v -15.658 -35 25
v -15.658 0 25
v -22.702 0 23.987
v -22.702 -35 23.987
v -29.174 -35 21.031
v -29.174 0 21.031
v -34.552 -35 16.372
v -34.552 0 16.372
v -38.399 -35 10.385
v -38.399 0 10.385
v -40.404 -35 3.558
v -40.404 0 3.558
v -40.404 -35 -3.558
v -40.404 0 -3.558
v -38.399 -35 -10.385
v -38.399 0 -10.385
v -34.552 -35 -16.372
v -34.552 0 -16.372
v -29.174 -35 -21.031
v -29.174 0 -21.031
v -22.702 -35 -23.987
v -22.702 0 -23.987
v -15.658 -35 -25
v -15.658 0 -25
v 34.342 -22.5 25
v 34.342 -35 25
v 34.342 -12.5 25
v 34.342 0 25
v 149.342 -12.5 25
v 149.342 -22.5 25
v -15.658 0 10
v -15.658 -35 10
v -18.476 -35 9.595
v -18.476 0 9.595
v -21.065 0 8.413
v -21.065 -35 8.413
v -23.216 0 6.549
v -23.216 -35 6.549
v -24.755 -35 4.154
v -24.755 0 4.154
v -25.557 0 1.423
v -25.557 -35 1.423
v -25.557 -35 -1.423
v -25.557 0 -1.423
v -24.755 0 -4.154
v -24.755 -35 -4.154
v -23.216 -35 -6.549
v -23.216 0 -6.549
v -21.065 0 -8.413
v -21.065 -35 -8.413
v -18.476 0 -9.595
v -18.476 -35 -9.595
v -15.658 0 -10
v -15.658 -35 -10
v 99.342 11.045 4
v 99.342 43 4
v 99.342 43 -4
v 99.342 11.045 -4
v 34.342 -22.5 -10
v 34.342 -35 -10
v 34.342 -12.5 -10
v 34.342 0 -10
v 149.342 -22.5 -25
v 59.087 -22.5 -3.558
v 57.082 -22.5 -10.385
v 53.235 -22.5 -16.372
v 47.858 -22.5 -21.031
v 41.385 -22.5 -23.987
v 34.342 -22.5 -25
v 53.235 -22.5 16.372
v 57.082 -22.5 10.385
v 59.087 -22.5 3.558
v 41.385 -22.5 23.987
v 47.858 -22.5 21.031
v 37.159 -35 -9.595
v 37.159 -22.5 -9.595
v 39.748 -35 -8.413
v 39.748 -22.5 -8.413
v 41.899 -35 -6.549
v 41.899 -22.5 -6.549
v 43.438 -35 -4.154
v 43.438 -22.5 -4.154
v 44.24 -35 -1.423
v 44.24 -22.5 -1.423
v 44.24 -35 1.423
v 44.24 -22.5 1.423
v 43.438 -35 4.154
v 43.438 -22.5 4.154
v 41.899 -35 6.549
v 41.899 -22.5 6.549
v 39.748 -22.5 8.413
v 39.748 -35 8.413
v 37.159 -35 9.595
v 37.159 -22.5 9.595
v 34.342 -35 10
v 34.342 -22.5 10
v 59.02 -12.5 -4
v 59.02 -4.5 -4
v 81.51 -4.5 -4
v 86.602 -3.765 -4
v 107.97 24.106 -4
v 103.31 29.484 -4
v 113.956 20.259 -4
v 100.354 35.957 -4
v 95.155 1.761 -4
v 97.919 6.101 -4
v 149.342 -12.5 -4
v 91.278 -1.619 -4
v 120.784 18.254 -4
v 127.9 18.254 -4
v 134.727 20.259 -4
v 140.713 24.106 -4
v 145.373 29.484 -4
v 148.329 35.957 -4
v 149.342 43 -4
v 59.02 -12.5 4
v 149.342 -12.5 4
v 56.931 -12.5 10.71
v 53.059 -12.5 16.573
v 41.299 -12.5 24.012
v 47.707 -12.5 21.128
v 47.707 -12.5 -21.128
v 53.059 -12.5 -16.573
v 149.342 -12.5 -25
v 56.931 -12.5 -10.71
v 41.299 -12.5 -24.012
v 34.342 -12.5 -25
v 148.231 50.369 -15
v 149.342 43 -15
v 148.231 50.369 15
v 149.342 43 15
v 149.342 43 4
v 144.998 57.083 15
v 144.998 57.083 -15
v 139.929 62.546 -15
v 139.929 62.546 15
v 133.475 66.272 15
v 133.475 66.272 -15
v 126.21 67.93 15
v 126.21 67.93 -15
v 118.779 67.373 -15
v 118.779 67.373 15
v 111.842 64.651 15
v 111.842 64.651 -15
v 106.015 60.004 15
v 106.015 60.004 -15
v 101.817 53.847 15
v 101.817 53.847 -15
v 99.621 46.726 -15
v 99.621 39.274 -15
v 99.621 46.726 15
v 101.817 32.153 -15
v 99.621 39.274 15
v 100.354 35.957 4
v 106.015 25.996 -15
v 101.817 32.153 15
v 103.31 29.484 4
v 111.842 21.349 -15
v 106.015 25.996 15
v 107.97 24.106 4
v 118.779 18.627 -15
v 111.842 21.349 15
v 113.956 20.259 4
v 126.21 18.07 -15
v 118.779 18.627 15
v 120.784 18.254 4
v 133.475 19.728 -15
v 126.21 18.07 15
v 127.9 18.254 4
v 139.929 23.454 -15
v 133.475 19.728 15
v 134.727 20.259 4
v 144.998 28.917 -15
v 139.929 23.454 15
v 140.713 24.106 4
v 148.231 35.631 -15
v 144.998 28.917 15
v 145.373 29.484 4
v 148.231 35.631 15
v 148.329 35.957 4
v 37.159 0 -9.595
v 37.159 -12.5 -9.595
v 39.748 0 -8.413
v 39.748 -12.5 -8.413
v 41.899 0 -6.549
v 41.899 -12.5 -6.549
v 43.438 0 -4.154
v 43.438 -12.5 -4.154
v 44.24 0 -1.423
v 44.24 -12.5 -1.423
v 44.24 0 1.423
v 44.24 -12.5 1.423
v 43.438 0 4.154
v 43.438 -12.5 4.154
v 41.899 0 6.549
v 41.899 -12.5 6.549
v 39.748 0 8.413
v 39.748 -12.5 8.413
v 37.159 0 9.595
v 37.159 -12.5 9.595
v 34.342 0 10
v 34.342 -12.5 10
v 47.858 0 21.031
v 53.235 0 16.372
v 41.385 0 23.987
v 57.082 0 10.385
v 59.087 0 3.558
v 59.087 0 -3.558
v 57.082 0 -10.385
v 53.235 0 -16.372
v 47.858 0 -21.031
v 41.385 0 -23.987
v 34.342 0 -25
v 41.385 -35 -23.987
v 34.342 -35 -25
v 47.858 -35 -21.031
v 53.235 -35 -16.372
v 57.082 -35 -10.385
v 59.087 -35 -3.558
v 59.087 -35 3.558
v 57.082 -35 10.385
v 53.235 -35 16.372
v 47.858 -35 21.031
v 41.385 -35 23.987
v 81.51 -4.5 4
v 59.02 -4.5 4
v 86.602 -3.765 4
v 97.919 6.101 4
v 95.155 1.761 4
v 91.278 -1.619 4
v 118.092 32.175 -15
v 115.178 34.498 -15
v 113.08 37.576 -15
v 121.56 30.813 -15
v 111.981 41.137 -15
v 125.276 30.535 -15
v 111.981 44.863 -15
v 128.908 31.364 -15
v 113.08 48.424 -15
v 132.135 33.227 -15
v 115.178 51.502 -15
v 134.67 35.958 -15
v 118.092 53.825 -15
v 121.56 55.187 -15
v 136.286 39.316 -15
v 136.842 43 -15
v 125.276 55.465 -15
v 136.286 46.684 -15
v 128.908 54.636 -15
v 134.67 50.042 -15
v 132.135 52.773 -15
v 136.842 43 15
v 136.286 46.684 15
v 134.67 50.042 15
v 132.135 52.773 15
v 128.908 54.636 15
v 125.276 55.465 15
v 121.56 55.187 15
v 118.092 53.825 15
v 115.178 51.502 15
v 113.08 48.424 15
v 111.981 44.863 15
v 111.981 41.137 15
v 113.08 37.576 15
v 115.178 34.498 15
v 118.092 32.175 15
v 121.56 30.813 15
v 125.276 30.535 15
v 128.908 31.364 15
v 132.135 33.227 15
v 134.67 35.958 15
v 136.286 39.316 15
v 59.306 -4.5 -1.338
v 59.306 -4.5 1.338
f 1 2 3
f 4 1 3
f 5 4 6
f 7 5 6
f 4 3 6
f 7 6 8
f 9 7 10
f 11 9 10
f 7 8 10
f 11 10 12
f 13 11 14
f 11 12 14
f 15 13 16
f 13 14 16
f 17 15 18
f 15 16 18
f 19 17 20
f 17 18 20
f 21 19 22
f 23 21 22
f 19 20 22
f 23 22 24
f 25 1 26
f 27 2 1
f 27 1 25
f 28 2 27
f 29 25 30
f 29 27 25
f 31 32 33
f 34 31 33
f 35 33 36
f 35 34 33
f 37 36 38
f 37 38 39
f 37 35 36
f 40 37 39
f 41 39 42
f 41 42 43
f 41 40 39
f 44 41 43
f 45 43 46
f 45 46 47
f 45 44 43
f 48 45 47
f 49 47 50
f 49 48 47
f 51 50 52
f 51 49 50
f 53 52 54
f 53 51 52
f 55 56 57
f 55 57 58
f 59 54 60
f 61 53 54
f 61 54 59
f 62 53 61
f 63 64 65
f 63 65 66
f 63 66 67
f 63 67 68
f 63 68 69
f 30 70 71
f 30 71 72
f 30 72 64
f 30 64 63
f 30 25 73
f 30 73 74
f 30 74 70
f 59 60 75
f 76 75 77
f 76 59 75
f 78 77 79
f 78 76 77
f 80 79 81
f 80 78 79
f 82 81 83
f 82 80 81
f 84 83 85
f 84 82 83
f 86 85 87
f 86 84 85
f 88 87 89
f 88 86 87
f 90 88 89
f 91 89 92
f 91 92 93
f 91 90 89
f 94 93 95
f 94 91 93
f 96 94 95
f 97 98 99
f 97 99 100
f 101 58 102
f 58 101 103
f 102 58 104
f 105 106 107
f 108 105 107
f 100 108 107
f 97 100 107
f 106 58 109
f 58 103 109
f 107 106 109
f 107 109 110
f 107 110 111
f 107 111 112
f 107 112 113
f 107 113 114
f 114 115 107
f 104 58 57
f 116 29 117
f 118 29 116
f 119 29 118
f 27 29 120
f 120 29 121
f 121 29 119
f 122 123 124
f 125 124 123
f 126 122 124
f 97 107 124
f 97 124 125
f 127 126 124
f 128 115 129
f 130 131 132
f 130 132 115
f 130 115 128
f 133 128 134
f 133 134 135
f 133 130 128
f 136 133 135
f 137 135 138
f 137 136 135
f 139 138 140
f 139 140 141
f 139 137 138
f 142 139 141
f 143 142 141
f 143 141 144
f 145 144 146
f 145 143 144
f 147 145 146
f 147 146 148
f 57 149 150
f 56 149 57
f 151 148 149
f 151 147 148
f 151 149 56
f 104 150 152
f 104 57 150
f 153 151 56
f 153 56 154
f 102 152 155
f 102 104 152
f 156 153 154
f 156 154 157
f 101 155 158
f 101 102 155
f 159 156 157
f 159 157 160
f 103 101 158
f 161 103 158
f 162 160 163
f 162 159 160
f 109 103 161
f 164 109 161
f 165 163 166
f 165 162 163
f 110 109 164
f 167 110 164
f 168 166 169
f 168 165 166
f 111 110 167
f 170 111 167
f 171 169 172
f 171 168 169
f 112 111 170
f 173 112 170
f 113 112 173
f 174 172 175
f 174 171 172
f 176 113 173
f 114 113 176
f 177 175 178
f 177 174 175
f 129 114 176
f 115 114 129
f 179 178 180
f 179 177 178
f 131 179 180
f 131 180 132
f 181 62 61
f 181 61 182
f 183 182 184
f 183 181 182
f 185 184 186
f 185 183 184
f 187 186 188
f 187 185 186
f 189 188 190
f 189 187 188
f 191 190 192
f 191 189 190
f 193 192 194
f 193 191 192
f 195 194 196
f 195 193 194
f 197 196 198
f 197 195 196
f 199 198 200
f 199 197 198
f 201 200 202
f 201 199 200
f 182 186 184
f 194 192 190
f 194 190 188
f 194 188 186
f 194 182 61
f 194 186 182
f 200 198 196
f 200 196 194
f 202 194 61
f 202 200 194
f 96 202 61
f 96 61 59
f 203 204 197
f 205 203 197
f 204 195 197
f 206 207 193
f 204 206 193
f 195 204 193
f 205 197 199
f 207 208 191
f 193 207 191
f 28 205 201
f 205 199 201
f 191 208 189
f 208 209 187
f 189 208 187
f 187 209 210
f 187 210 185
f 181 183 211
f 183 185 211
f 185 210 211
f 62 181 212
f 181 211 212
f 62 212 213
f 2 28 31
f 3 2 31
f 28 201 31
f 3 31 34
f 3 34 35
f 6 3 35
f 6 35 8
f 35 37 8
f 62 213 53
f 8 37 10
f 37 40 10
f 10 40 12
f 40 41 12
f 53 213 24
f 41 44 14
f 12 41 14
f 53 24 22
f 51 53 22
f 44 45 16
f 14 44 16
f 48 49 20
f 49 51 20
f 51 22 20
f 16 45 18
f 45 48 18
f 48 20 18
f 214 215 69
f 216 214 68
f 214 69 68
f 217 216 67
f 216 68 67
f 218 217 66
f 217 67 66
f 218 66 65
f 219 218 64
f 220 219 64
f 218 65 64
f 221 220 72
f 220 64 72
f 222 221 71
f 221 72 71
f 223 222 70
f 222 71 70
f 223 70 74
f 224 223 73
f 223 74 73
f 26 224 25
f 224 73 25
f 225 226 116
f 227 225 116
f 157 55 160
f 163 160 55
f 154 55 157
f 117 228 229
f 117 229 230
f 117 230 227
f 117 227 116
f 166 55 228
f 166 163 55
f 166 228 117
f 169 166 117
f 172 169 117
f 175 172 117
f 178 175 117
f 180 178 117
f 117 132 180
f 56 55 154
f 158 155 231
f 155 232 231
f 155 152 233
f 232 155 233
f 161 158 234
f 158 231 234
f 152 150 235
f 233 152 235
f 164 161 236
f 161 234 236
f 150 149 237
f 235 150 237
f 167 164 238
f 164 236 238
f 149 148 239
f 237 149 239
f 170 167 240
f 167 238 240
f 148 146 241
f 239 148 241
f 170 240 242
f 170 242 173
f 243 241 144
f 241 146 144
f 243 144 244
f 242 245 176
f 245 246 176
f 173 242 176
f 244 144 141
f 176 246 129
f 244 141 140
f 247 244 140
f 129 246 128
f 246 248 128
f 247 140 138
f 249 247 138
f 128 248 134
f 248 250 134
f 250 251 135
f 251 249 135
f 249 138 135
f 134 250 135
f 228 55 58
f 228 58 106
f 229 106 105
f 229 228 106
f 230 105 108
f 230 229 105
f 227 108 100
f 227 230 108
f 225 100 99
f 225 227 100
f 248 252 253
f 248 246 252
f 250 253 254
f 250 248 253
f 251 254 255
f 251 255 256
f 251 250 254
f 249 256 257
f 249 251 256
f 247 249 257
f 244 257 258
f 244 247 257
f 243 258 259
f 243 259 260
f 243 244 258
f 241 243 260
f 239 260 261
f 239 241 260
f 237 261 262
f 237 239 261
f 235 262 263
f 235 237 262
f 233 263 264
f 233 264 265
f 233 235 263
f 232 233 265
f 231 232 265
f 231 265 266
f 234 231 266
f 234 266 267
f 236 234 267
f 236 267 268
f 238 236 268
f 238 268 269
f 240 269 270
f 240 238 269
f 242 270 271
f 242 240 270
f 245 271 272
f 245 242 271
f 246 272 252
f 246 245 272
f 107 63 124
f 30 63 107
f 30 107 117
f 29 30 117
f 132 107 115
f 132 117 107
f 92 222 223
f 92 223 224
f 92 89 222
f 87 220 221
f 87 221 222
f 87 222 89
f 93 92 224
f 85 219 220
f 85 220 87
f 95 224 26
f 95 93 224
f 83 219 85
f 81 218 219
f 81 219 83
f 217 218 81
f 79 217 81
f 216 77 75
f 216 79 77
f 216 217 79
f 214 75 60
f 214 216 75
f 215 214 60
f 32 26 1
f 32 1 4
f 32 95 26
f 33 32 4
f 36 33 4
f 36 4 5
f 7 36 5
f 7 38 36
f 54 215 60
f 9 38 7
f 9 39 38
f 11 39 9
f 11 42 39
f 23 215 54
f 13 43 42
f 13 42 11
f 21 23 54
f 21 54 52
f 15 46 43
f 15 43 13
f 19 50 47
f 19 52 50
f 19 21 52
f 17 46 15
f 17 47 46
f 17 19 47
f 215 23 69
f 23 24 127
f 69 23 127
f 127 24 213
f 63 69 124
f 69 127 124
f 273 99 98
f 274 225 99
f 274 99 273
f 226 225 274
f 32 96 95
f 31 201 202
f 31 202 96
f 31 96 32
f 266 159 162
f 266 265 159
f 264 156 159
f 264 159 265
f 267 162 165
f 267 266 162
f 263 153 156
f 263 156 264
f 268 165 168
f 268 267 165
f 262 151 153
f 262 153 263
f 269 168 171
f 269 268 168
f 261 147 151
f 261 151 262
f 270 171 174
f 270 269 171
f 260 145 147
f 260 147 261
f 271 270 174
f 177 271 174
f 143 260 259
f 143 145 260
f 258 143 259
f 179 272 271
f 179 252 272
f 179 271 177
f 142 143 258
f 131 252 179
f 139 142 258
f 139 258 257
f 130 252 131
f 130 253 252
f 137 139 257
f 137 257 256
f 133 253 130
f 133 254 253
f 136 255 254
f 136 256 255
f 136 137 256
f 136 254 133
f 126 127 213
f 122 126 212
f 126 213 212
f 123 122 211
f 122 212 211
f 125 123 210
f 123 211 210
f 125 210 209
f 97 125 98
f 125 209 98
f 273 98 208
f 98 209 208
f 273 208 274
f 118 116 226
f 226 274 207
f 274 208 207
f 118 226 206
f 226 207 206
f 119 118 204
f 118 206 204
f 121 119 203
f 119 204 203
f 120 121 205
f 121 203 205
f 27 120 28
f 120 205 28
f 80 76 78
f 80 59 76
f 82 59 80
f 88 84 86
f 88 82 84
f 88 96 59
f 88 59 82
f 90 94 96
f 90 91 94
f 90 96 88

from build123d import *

# Parameters (mm, degrees)
BOSS_EXTRUDE1_DEPTH = 35
BOSS_EXTRUDE2_DEPTH = 50
BOSS_EXTRUDE4_DEPTH = 4
SKETCH4_R           = 25
SKETCH4_R_2         = 12.5
BOSS_EXTRUDE5_DEPTH = 15


with BuildPart() as part:
    # Sketch1 → Boss-Extrude1 (new body)
    with BuildSketch(Plane(origin=(0, 0, 0), x_dir=(1, 0, 0), z_dir=(0, 1, 0))):
        with BuildLine():
            Line((-15.658362989, 25), (34.341637011, 25))
            ThreePointArc((34.341637011, 25), (59.341637011, 0), (34.341637011, -25))
            Line((34.341637011, -25), (-15.658362989, -25))
            ThreePointArc((-15.658362989, -25), (-40.658362989, 0), (-15.658362989, 25))
        make_face()
        with BuildLine():
            Line((-15.658362989, 10), (34.341637011, 10))
            ThreePointArc((34.341637011, 10), (44.341637011, 0), (34.341637011, -10))
            Line((34.341637011, -10), (-15.658362989, -10))
            ThreePointArc((-15.658362989, -10), (-25.658362989, 0), (-15.658362989, 10))
        make_face(mode=Mode.SUBTRACT)
    extrude(amount=-BOSS_EXTRUDE1_DEPTH)

    # Sketch2 → Boss-Extrude2 (add)
    with BuildSketch(Plane.XY.offset(25)):
        Polygon((59.341637011, -12.5), (34.341637011, -12.5), (34.341637011, -22.5), (59.341637011, -22.5), (149.341637011, -22.5), (149.341637011, -12.5), align=None)
    extrude(amount=-BOSS_EXTRUDE2_DEPTH)

    # Sketch3 → Boss-Extrude4 (add, symmetric)
    with BuildSketch(Plane.XY):
        with BuildLine():
            Line((58.524856224, -12.5), (59.341637011, -12.5))
            Line((59.341637011, -12.5), (149.341637011, -12.5))
            Line((149.341637011, -12.5), (149.341637011, 43))
            ThreePointArc((149.341637011, 43), (124.341637011, 18), (99.341637011, 43))
            Line((99.341637011, 43), (99.341637011, 11.044665925))
            ThreePointArc((99.341637011, 11.044665925), (93.33790357, -0.068272059), (81.509886267, -4.5))
            Line((81.509886267, -4.5), (58.524856224, -4.5))
            Line((58.524856224, -4.5), (58.524856224, -12.5))
        make_face()
    extrude(amount=BOSS_EXTRUDE4_DEPTH, both=True)

    # Sketch4 → Boss-Extrude5 (add, symmetric)
    with BuildSketch(Plane.XY):
        with Locations((124.341637011, 43)):
            Circle(SKETCH4_R)
        with Locations((124.341637011, 43)):
            Circle(SKETCH4_R_2, mode=Mode.SUBTRACT)
    extrude(amount=BOSS_EXTRUDE5_DEPTH, both=True)


solid = part.part
